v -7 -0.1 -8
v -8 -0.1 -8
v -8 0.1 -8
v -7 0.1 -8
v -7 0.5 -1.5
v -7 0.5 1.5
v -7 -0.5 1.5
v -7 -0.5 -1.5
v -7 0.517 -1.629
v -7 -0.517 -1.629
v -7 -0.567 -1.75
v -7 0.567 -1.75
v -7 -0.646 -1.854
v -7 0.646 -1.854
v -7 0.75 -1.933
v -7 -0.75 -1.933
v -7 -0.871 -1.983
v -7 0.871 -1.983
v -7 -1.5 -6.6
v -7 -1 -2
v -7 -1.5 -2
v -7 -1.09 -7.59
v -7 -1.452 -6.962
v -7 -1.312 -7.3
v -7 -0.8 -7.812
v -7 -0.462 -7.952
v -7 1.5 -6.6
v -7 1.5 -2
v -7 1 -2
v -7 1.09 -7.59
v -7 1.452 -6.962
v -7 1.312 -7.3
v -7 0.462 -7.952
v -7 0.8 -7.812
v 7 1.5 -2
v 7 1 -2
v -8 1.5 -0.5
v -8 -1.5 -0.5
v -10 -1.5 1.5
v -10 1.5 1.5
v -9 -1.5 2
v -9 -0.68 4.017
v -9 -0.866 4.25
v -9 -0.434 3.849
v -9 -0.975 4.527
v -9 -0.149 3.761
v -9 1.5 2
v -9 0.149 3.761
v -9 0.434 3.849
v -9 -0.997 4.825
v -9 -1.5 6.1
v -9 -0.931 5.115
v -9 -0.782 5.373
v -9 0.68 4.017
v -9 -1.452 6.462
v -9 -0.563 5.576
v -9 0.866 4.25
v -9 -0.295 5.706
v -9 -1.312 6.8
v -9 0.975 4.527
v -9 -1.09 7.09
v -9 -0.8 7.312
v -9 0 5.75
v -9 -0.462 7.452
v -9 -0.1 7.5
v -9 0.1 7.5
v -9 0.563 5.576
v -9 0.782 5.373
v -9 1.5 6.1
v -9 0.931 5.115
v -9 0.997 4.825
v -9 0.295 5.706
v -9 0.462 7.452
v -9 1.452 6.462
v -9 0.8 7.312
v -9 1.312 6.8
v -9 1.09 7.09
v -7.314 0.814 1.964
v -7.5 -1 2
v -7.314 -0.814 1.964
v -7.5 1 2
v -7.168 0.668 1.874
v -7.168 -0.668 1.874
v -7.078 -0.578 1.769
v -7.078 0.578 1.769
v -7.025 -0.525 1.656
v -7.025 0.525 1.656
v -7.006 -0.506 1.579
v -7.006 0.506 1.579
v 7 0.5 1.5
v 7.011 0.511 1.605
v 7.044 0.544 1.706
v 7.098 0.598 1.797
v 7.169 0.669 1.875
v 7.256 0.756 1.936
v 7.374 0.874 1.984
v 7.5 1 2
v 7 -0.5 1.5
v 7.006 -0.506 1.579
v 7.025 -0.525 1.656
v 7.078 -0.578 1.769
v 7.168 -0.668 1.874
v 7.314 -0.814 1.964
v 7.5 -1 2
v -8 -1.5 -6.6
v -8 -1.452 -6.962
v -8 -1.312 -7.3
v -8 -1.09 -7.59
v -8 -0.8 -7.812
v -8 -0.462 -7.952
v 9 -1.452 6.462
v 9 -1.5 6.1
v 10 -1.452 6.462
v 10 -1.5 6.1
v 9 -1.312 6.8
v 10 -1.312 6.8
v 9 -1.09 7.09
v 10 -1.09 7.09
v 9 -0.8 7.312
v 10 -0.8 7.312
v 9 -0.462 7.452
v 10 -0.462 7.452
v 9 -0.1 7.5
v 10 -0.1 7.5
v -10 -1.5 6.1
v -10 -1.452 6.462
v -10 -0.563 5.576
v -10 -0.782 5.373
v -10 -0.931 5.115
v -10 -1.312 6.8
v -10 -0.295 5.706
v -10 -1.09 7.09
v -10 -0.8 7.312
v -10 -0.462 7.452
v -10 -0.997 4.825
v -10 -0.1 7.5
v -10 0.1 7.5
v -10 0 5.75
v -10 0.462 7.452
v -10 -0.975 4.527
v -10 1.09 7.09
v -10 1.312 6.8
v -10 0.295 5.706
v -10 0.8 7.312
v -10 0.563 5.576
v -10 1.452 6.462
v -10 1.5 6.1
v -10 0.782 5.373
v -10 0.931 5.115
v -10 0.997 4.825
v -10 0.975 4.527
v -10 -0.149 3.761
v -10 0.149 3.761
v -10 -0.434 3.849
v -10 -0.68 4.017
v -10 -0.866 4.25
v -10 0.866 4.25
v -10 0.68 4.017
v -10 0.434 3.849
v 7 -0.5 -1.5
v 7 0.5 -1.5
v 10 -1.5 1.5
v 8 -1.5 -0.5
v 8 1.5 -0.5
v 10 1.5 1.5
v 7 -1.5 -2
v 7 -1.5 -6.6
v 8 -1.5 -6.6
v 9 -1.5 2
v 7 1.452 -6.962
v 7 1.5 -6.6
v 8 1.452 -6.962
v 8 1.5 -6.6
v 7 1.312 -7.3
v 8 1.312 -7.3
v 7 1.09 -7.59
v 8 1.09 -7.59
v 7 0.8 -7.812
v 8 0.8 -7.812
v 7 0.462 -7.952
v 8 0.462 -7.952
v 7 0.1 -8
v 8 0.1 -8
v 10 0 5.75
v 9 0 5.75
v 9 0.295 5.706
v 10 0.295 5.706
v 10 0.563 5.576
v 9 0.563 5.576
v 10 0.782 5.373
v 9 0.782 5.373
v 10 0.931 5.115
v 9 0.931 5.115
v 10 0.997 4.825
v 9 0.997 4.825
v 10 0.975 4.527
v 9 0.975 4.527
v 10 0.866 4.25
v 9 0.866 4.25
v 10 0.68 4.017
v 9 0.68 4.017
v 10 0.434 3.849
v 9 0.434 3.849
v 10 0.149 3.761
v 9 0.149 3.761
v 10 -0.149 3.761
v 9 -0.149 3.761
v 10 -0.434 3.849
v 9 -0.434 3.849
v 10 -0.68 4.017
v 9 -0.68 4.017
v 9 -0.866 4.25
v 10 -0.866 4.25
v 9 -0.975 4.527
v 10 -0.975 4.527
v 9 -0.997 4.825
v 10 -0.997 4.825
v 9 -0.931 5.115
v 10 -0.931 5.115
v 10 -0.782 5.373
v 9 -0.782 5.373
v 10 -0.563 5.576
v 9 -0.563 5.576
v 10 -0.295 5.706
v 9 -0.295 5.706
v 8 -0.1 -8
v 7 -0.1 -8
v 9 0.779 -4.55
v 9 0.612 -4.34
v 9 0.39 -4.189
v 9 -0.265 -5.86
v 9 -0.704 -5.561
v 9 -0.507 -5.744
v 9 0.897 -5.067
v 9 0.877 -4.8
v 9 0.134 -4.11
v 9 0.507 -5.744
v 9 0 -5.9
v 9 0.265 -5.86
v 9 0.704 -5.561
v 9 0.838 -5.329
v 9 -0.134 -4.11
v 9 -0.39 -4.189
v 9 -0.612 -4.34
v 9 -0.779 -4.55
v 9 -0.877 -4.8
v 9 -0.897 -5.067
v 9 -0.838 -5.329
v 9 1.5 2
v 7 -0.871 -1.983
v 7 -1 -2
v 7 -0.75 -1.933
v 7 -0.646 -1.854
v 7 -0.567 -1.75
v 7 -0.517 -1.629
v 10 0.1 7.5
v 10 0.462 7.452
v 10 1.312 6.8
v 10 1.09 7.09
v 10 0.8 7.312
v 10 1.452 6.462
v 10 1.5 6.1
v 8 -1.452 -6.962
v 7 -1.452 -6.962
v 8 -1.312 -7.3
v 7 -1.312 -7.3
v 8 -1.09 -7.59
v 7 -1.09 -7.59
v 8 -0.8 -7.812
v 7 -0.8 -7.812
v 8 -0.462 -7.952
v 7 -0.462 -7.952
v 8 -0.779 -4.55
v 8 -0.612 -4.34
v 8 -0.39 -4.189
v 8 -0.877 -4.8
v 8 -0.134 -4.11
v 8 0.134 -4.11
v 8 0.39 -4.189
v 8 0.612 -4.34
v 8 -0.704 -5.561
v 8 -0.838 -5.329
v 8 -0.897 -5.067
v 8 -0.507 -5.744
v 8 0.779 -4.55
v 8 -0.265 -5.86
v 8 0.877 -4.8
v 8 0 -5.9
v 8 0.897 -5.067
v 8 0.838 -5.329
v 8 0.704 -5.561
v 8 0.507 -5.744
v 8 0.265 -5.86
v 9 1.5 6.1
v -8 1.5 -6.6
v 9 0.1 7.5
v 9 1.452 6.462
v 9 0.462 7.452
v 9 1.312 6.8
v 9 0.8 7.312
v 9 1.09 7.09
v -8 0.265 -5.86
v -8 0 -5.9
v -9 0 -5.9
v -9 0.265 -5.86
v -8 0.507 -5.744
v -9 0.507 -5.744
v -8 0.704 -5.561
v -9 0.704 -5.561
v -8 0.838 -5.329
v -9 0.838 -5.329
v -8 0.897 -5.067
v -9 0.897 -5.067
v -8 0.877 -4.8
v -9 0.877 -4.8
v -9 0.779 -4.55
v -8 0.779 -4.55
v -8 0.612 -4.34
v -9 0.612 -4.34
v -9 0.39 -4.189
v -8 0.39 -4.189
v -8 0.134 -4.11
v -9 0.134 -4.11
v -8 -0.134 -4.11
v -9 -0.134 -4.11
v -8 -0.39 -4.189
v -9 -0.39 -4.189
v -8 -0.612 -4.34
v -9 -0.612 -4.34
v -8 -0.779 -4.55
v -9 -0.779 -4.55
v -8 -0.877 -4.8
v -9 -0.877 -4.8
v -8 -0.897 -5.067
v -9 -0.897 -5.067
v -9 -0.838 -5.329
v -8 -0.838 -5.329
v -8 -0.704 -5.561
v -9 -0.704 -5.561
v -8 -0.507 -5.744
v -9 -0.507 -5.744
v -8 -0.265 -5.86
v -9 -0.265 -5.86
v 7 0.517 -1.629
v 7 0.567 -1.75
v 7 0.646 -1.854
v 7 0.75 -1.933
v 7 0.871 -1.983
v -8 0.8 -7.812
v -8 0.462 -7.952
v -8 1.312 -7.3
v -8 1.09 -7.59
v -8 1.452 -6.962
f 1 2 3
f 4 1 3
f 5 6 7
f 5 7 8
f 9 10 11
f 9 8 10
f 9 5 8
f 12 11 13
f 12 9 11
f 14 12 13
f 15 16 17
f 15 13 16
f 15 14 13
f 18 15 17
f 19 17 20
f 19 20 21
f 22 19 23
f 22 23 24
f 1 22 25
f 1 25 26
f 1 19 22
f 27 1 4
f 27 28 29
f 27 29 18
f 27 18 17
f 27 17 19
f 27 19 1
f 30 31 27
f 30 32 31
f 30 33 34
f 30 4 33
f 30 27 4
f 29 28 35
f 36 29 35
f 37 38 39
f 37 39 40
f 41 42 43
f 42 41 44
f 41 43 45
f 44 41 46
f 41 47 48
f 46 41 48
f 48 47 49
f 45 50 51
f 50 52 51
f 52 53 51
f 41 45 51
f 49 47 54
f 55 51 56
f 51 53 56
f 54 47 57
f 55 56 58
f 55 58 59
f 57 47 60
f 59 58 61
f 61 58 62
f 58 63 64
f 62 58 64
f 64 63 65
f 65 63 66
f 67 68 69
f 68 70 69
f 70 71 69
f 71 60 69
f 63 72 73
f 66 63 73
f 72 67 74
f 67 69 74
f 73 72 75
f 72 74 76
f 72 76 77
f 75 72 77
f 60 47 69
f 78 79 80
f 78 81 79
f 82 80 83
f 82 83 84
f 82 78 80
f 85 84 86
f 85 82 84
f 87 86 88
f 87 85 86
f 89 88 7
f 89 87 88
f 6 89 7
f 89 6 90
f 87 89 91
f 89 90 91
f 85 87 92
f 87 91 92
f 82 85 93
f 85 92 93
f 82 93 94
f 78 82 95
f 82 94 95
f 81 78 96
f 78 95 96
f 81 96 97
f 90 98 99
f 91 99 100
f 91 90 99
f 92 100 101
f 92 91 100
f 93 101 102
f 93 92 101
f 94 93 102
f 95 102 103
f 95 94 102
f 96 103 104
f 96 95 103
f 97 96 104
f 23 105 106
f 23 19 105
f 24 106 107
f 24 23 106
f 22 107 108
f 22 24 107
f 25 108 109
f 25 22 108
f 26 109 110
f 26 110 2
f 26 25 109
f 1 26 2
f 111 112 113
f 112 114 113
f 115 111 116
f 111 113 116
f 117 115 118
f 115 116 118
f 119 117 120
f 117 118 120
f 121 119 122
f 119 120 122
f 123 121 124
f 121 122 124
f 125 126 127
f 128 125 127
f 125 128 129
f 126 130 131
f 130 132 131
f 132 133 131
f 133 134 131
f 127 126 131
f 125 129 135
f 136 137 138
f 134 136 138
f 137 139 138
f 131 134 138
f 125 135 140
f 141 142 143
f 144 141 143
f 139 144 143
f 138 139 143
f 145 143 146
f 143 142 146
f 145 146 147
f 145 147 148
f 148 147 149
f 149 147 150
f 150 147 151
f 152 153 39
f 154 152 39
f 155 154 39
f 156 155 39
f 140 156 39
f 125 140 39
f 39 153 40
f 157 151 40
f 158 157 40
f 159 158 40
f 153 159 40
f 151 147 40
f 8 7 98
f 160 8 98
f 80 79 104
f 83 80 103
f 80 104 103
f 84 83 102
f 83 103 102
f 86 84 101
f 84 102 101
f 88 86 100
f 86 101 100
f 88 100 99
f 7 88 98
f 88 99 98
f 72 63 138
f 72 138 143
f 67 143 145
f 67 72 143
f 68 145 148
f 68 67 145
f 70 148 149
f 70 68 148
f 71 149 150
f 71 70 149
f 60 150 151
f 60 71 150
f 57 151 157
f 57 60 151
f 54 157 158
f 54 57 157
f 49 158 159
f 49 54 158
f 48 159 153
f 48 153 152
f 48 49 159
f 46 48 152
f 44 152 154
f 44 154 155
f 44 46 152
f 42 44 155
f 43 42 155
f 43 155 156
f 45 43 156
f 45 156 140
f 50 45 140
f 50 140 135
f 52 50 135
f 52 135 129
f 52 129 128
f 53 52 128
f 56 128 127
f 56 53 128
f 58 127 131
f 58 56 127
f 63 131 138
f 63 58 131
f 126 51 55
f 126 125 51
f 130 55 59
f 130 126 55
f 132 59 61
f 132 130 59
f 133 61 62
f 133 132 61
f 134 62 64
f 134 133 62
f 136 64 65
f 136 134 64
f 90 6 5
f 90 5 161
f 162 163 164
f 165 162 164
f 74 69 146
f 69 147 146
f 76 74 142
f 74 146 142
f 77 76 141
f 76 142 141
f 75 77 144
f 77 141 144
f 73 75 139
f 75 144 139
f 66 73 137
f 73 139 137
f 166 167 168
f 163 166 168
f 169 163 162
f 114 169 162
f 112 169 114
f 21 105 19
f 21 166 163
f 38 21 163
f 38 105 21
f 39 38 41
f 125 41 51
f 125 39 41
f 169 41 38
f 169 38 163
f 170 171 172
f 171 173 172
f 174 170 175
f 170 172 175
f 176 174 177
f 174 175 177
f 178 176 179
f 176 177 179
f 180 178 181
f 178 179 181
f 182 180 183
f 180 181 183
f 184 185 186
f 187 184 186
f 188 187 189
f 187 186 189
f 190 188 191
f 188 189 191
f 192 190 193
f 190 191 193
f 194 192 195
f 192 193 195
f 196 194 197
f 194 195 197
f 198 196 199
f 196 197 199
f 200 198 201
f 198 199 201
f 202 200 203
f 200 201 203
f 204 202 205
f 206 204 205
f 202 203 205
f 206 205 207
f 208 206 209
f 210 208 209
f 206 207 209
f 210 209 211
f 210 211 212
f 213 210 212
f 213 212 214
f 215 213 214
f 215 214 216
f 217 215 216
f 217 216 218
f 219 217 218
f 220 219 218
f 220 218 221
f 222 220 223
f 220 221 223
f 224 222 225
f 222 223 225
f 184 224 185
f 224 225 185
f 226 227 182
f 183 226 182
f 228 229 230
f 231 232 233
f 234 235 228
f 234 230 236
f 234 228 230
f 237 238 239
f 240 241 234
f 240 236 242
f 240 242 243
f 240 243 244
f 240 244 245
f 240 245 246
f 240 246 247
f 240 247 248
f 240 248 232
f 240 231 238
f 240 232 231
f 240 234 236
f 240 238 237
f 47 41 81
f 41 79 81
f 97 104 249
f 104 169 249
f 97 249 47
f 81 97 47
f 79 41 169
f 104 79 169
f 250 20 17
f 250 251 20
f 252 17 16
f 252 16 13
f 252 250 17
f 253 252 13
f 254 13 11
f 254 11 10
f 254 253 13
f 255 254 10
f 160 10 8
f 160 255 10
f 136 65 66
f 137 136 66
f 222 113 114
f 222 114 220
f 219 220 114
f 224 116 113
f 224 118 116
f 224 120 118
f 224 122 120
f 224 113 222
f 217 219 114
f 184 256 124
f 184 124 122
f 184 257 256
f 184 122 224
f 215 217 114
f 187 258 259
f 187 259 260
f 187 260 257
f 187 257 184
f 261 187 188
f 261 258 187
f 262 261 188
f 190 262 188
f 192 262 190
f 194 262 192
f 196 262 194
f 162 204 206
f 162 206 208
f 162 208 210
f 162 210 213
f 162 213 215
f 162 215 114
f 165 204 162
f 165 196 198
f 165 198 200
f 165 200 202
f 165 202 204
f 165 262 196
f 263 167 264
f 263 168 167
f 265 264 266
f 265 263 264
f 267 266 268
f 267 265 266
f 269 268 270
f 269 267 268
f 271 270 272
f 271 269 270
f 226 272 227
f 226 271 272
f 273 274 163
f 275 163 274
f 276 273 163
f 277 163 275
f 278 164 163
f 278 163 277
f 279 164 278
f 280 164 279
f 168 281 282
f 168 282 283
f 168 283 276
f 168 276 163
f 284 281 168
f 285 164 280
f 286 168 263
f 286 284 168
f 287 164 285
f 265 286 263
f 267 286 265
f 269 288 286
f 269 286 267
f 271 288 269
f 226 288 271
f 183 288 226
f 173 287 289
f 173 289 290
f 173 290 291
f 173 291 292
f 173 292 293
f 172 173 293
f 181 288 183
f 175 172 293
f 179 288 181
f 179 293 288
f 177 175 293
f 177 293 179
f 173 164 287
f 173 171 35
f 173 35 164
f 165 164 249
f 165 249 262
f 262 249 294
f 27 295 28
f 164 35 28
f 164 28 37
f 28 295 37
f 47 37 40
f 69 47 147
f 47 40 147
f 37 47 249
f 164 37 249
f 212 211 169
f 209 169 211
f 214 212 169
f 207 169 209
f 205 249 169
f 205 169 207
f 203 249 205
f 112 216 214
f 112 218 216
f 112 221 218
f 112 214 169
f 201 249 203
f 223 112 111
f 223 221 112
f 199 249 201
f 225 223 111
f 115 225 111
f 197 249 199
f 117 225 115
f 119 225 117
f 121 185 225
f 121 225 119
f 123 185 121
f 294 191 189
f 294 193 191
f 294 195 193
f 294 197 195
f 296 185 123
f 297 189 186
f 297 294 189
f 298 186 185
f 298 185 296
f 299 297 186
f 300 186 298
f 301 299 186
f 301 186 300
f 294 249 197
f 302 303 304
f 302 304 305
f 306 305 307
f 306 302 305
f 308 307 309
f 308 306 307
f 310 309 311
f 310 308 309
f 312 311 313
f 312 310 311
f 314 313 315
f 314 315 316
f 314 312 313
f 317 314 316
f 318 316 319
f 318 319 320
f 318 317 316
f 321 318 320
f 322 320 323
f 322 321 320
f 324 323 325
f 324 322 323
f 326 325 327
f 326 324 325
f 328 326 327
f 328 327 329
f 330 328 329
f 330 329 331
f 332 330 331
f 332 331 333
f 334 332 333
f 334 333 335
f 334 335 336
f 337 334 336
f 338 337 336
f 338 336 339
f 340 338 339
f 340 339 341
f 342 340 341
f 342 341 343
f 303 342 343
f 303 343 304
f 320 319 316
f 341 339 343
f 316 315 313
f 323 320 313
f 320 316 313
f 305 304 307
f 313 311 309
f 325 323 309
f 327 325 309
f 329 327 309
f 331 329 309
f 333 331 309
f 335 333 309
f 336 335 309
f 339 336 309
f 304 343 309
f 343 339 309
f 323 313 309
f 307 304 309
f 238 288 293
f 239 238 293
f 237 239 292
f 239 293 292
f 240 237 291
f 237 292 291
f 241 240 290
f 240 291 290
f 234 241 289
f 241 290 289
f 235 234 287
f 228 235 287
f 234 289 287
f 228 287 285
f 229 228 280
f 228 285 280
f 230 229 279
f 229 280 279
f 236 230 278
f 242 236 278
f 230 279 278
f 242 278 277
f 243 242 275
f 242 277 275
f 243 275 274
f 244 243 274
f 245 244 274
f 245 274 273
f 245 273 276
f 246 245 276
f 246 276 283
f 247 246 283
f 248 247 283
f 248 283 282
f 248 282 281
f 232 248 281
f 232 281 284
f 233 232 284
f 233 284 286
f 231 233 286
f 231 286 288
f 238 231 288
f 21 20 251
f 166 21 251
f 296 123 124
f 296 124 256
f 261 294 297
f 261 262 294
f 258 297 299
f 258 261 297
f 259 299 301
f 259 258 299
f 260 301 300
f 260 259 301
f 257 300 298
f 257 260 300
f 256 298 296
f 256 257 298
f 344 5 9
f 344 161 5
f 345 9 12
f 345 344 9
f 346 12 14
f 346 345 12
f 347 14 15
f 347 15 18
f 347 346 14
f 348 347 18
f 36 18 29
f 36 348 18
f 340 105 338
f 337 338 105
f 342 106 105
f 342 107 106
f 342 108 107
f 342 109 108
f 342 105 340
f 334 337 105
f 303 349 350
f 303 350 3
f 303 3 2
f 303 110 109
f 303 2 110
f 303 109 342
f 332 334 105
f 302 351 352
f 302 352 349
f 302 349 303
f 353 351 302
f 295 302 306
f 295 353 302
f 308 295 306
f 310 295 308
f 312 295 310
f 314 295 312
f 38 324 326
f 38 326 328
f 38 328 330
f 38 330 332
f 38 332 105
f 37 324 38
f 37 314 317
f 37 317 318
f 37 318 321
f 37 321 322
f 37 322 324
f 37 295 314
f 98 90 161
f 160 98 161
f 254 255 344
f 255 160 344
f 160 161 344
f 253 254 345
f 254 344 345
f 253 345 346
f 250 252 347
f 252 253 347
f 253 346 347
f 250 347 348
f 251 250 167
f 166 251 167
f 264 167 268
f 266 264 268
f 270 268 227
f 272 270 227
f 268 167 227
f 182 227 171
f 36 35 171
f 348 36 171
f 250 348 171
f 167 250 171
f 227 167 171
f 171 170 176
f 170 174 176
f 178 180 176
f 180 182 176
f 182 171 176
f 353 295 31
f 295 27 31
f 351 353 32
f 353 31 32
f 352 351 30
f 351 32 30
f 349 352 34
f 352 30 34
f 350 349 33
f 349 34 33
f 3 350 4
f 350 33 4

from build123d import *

# Parameters (mm, degrees)
SKETCH1_W           = 16
SKETCH1_H           = 3
SKETCH1_W_2         = 14
SKETCH1_H_2         = 1
EXTRUDE_THIN1_DEPTH = 2
SKETCH2_W           = 6
SKETCH2_H           = 3
BOSS_EXTRUDE1_DEPTH = 2
CHAMFER3_SIZE       = 2
SKETCH3_W           = 5.5
SKETCH3_H           = 3
CUT_EXTRUDE1_DEPTH  = 1
BOSS_EXTRUDE2_START = -1
SKETCH4_W           = 6
SKETCH4_H           = 3
BOSS_EXTRUDE2_DEPTH = 1
SKETCH5_W           = 6
SKETCH5_H           = 3
BOSS_EXTRUDE3_DEPTH = 1
CHAMFER4_SIZE       = 2
FILLET1_R           = 1.4
SKETCH7_R           = 1
CUT_EXTRUDE3_DEPTH  = 1
SKETCH8_R           = 0.9
BOSS_EXTRUDE5_DEPTH = 2
FILLET4_R           = 0.5
FILLET6_R           = 0.5


with BuildPart() as part:
    # Sketch1 → Extrude-Thin1 (new, symmetric)
    with BuildSketch(Plane.XY):
        Rectangle(SKETCH1_W, SKETCH1_H)
        Rectangle(SKETCH1_W_2, SKETCH1_H_2, mode=Mode.SUBTRACT)
    extrude(amount=EXTRUDE_THIN1_DEPTH, both=True)

    # Sketch2 → Boss-Extrude1 (add)
    with BuildSketch(Plane(origin=(8, 0, 0), x_dir=(0, 0, -1), z_dir=(1, 0, 0))):
        with Locations((-4.5, 0)):
            Rectangle(SKETCH2_W, SKETCH2_H)
    boss_extrude1 = extrude(amount=BOSS_EXTRUDE1_DEPTH)

    # Chamfer3
    chamfer3_edges = [part.edges().sort_by_distance(p)[0] for p in [
        (8, 0, 1.5),
    ]]
    chamfer(chamfer3_edges, length=CHAMFER3_SIZE - 0.0001)  # a hair under: the kernel refuses the full size

    # Sketch3 → Cut-Extrude1 (cut)
    with BuildSketch(Plane.ZY.offset(-8)):
        with Locations((4.75, 0)):
            Rectangle(SKETCH3_W, SKETCH3_H)
    cut_extrude1 = extrude(amount=-CUT_EXTRUDE1_DEPTH, mode=Mode.SUBTRACT)

    # Sketch4 → Boss-Extrude2 (add)
    with BuildSketch(Plane(origin=(8, 0, 0), x_dir=(0, 0, -1), z_dir=(1, 0, 0)).offset(BOSS_EXTRUDE2_START)):
        with Locations((5, 0)):
            Rectangle(SKETCH4_W, SKETCH4_H)
    extrude(amount=BOSS_EXTRUDE2_DEPTH)

    # Mirror2: Boss-Extrude1, Cut-Extrude1 across plane
    add(boss_extrude1.mirror(Plane(origin=(0, 0, 0), x_dir=(0, 0, 1), z_dir=(1, 0, 0))))
    add(cut_extrude1.mirror(Plane(origin=(0, 0, 0), x_dir=(0, 0, 1), z_dir=(1, 0, 0))), mode=Mode.SUBTRACT)

    # Sketch5 → Boss-Extrude3 (add)
    with BuildSketch(Plane.ZY.offset(8)):
        with Locations((-5, 0)):
            Rectangle(SKETCH5_W, SKETCH5_H)
    extrude(amount=-BOSS_EXTRUDE3_DEPTH)

    # Chamfer4
    chamfer4_edges = [part.edges().sort_by_distance(p)[0] for p in [
        (-8, 0, 1.5),
    ]]
    chamfer(chamfer4_edges, length=CHAMFER4_SIZE - 0.0001)  # a hair under: the kernel refuses the full size

    # Fillet1
    fillet1_edges = [part.edges().sort_by_distance(p)[0] for p in [
        (-7.5, 1.5, -8),
        (-7.5, -1.5, -8),
        (9.5, 1.5, 7.5),
        (9.5, -1.5, 7.5),
        (7.5, -1.5, -8),
        (7.5, 1.5, -8),
        (-9.5, -1.5, 7.5),
        (-9.5, 1.5, 7.5),
    ]]
    fillet(fillet1_edges, radius=FILLET1_R)

    # Sketch7 → Cut-Extrude3 (cut)
    with BuildSketch(Plane.ZY.offset(-9)):
        with Locations((4.75, 0)):
            Circle(SKETCH7_R)
    cut_extrude3 = extrude(amount=-CUT_EXTRUDE3_DEPTH, mode=Mode.SUBTRACT)

    # Mirror6: Cut-Extrude3 across plane
    add(cut_extrude3.mirror(Plane(origin=(0, 0, 0), x_dir=(0, 0, 1), z_dir=(1, 0, 0))), mode=Mode.SUBTRACT)

    # Sketch8 → Boss-Extrude5 (add)
    with BuildSketch(Plane(origin=(-7, 0, 0), x_dir=(0, 0, -1), z_dir=(1, 0, 0))):
        with Locations((5, 0)):
            Circle(SKETCH8_R)
    boss_extrude5 = extrude(amount=-BOSS_EXTRUDE5_DEPTH)

    # Mirror7: Boss-Extrude5 across plane
    add(boss_extrude5.mirror(Plane(origin=(0, 0, 0), x_dir=(0, 0, 1), z_dir=(1, 0, 0))))

    # Fillet4
    fillet4_edges = [part.edges().sort_by_distance(p)[0] for p in [
        (0, -0.5, -2),
        (0, 0.5, -2),
    ]]
    fillet(fillet4_edges, radius=FILLET4_R)

    # Fillet6
    fillet6_edges = [part.edges().sort_by_distance(p)[0] for p in [
        (-7, 0, 2),
        (0, -0.5, 2),
        (7, 0, 2),
        (0, 0.5, 2),
    ]]
    fillet(fillet6_edges, radius=FILLET6_R)


solid = part.part
